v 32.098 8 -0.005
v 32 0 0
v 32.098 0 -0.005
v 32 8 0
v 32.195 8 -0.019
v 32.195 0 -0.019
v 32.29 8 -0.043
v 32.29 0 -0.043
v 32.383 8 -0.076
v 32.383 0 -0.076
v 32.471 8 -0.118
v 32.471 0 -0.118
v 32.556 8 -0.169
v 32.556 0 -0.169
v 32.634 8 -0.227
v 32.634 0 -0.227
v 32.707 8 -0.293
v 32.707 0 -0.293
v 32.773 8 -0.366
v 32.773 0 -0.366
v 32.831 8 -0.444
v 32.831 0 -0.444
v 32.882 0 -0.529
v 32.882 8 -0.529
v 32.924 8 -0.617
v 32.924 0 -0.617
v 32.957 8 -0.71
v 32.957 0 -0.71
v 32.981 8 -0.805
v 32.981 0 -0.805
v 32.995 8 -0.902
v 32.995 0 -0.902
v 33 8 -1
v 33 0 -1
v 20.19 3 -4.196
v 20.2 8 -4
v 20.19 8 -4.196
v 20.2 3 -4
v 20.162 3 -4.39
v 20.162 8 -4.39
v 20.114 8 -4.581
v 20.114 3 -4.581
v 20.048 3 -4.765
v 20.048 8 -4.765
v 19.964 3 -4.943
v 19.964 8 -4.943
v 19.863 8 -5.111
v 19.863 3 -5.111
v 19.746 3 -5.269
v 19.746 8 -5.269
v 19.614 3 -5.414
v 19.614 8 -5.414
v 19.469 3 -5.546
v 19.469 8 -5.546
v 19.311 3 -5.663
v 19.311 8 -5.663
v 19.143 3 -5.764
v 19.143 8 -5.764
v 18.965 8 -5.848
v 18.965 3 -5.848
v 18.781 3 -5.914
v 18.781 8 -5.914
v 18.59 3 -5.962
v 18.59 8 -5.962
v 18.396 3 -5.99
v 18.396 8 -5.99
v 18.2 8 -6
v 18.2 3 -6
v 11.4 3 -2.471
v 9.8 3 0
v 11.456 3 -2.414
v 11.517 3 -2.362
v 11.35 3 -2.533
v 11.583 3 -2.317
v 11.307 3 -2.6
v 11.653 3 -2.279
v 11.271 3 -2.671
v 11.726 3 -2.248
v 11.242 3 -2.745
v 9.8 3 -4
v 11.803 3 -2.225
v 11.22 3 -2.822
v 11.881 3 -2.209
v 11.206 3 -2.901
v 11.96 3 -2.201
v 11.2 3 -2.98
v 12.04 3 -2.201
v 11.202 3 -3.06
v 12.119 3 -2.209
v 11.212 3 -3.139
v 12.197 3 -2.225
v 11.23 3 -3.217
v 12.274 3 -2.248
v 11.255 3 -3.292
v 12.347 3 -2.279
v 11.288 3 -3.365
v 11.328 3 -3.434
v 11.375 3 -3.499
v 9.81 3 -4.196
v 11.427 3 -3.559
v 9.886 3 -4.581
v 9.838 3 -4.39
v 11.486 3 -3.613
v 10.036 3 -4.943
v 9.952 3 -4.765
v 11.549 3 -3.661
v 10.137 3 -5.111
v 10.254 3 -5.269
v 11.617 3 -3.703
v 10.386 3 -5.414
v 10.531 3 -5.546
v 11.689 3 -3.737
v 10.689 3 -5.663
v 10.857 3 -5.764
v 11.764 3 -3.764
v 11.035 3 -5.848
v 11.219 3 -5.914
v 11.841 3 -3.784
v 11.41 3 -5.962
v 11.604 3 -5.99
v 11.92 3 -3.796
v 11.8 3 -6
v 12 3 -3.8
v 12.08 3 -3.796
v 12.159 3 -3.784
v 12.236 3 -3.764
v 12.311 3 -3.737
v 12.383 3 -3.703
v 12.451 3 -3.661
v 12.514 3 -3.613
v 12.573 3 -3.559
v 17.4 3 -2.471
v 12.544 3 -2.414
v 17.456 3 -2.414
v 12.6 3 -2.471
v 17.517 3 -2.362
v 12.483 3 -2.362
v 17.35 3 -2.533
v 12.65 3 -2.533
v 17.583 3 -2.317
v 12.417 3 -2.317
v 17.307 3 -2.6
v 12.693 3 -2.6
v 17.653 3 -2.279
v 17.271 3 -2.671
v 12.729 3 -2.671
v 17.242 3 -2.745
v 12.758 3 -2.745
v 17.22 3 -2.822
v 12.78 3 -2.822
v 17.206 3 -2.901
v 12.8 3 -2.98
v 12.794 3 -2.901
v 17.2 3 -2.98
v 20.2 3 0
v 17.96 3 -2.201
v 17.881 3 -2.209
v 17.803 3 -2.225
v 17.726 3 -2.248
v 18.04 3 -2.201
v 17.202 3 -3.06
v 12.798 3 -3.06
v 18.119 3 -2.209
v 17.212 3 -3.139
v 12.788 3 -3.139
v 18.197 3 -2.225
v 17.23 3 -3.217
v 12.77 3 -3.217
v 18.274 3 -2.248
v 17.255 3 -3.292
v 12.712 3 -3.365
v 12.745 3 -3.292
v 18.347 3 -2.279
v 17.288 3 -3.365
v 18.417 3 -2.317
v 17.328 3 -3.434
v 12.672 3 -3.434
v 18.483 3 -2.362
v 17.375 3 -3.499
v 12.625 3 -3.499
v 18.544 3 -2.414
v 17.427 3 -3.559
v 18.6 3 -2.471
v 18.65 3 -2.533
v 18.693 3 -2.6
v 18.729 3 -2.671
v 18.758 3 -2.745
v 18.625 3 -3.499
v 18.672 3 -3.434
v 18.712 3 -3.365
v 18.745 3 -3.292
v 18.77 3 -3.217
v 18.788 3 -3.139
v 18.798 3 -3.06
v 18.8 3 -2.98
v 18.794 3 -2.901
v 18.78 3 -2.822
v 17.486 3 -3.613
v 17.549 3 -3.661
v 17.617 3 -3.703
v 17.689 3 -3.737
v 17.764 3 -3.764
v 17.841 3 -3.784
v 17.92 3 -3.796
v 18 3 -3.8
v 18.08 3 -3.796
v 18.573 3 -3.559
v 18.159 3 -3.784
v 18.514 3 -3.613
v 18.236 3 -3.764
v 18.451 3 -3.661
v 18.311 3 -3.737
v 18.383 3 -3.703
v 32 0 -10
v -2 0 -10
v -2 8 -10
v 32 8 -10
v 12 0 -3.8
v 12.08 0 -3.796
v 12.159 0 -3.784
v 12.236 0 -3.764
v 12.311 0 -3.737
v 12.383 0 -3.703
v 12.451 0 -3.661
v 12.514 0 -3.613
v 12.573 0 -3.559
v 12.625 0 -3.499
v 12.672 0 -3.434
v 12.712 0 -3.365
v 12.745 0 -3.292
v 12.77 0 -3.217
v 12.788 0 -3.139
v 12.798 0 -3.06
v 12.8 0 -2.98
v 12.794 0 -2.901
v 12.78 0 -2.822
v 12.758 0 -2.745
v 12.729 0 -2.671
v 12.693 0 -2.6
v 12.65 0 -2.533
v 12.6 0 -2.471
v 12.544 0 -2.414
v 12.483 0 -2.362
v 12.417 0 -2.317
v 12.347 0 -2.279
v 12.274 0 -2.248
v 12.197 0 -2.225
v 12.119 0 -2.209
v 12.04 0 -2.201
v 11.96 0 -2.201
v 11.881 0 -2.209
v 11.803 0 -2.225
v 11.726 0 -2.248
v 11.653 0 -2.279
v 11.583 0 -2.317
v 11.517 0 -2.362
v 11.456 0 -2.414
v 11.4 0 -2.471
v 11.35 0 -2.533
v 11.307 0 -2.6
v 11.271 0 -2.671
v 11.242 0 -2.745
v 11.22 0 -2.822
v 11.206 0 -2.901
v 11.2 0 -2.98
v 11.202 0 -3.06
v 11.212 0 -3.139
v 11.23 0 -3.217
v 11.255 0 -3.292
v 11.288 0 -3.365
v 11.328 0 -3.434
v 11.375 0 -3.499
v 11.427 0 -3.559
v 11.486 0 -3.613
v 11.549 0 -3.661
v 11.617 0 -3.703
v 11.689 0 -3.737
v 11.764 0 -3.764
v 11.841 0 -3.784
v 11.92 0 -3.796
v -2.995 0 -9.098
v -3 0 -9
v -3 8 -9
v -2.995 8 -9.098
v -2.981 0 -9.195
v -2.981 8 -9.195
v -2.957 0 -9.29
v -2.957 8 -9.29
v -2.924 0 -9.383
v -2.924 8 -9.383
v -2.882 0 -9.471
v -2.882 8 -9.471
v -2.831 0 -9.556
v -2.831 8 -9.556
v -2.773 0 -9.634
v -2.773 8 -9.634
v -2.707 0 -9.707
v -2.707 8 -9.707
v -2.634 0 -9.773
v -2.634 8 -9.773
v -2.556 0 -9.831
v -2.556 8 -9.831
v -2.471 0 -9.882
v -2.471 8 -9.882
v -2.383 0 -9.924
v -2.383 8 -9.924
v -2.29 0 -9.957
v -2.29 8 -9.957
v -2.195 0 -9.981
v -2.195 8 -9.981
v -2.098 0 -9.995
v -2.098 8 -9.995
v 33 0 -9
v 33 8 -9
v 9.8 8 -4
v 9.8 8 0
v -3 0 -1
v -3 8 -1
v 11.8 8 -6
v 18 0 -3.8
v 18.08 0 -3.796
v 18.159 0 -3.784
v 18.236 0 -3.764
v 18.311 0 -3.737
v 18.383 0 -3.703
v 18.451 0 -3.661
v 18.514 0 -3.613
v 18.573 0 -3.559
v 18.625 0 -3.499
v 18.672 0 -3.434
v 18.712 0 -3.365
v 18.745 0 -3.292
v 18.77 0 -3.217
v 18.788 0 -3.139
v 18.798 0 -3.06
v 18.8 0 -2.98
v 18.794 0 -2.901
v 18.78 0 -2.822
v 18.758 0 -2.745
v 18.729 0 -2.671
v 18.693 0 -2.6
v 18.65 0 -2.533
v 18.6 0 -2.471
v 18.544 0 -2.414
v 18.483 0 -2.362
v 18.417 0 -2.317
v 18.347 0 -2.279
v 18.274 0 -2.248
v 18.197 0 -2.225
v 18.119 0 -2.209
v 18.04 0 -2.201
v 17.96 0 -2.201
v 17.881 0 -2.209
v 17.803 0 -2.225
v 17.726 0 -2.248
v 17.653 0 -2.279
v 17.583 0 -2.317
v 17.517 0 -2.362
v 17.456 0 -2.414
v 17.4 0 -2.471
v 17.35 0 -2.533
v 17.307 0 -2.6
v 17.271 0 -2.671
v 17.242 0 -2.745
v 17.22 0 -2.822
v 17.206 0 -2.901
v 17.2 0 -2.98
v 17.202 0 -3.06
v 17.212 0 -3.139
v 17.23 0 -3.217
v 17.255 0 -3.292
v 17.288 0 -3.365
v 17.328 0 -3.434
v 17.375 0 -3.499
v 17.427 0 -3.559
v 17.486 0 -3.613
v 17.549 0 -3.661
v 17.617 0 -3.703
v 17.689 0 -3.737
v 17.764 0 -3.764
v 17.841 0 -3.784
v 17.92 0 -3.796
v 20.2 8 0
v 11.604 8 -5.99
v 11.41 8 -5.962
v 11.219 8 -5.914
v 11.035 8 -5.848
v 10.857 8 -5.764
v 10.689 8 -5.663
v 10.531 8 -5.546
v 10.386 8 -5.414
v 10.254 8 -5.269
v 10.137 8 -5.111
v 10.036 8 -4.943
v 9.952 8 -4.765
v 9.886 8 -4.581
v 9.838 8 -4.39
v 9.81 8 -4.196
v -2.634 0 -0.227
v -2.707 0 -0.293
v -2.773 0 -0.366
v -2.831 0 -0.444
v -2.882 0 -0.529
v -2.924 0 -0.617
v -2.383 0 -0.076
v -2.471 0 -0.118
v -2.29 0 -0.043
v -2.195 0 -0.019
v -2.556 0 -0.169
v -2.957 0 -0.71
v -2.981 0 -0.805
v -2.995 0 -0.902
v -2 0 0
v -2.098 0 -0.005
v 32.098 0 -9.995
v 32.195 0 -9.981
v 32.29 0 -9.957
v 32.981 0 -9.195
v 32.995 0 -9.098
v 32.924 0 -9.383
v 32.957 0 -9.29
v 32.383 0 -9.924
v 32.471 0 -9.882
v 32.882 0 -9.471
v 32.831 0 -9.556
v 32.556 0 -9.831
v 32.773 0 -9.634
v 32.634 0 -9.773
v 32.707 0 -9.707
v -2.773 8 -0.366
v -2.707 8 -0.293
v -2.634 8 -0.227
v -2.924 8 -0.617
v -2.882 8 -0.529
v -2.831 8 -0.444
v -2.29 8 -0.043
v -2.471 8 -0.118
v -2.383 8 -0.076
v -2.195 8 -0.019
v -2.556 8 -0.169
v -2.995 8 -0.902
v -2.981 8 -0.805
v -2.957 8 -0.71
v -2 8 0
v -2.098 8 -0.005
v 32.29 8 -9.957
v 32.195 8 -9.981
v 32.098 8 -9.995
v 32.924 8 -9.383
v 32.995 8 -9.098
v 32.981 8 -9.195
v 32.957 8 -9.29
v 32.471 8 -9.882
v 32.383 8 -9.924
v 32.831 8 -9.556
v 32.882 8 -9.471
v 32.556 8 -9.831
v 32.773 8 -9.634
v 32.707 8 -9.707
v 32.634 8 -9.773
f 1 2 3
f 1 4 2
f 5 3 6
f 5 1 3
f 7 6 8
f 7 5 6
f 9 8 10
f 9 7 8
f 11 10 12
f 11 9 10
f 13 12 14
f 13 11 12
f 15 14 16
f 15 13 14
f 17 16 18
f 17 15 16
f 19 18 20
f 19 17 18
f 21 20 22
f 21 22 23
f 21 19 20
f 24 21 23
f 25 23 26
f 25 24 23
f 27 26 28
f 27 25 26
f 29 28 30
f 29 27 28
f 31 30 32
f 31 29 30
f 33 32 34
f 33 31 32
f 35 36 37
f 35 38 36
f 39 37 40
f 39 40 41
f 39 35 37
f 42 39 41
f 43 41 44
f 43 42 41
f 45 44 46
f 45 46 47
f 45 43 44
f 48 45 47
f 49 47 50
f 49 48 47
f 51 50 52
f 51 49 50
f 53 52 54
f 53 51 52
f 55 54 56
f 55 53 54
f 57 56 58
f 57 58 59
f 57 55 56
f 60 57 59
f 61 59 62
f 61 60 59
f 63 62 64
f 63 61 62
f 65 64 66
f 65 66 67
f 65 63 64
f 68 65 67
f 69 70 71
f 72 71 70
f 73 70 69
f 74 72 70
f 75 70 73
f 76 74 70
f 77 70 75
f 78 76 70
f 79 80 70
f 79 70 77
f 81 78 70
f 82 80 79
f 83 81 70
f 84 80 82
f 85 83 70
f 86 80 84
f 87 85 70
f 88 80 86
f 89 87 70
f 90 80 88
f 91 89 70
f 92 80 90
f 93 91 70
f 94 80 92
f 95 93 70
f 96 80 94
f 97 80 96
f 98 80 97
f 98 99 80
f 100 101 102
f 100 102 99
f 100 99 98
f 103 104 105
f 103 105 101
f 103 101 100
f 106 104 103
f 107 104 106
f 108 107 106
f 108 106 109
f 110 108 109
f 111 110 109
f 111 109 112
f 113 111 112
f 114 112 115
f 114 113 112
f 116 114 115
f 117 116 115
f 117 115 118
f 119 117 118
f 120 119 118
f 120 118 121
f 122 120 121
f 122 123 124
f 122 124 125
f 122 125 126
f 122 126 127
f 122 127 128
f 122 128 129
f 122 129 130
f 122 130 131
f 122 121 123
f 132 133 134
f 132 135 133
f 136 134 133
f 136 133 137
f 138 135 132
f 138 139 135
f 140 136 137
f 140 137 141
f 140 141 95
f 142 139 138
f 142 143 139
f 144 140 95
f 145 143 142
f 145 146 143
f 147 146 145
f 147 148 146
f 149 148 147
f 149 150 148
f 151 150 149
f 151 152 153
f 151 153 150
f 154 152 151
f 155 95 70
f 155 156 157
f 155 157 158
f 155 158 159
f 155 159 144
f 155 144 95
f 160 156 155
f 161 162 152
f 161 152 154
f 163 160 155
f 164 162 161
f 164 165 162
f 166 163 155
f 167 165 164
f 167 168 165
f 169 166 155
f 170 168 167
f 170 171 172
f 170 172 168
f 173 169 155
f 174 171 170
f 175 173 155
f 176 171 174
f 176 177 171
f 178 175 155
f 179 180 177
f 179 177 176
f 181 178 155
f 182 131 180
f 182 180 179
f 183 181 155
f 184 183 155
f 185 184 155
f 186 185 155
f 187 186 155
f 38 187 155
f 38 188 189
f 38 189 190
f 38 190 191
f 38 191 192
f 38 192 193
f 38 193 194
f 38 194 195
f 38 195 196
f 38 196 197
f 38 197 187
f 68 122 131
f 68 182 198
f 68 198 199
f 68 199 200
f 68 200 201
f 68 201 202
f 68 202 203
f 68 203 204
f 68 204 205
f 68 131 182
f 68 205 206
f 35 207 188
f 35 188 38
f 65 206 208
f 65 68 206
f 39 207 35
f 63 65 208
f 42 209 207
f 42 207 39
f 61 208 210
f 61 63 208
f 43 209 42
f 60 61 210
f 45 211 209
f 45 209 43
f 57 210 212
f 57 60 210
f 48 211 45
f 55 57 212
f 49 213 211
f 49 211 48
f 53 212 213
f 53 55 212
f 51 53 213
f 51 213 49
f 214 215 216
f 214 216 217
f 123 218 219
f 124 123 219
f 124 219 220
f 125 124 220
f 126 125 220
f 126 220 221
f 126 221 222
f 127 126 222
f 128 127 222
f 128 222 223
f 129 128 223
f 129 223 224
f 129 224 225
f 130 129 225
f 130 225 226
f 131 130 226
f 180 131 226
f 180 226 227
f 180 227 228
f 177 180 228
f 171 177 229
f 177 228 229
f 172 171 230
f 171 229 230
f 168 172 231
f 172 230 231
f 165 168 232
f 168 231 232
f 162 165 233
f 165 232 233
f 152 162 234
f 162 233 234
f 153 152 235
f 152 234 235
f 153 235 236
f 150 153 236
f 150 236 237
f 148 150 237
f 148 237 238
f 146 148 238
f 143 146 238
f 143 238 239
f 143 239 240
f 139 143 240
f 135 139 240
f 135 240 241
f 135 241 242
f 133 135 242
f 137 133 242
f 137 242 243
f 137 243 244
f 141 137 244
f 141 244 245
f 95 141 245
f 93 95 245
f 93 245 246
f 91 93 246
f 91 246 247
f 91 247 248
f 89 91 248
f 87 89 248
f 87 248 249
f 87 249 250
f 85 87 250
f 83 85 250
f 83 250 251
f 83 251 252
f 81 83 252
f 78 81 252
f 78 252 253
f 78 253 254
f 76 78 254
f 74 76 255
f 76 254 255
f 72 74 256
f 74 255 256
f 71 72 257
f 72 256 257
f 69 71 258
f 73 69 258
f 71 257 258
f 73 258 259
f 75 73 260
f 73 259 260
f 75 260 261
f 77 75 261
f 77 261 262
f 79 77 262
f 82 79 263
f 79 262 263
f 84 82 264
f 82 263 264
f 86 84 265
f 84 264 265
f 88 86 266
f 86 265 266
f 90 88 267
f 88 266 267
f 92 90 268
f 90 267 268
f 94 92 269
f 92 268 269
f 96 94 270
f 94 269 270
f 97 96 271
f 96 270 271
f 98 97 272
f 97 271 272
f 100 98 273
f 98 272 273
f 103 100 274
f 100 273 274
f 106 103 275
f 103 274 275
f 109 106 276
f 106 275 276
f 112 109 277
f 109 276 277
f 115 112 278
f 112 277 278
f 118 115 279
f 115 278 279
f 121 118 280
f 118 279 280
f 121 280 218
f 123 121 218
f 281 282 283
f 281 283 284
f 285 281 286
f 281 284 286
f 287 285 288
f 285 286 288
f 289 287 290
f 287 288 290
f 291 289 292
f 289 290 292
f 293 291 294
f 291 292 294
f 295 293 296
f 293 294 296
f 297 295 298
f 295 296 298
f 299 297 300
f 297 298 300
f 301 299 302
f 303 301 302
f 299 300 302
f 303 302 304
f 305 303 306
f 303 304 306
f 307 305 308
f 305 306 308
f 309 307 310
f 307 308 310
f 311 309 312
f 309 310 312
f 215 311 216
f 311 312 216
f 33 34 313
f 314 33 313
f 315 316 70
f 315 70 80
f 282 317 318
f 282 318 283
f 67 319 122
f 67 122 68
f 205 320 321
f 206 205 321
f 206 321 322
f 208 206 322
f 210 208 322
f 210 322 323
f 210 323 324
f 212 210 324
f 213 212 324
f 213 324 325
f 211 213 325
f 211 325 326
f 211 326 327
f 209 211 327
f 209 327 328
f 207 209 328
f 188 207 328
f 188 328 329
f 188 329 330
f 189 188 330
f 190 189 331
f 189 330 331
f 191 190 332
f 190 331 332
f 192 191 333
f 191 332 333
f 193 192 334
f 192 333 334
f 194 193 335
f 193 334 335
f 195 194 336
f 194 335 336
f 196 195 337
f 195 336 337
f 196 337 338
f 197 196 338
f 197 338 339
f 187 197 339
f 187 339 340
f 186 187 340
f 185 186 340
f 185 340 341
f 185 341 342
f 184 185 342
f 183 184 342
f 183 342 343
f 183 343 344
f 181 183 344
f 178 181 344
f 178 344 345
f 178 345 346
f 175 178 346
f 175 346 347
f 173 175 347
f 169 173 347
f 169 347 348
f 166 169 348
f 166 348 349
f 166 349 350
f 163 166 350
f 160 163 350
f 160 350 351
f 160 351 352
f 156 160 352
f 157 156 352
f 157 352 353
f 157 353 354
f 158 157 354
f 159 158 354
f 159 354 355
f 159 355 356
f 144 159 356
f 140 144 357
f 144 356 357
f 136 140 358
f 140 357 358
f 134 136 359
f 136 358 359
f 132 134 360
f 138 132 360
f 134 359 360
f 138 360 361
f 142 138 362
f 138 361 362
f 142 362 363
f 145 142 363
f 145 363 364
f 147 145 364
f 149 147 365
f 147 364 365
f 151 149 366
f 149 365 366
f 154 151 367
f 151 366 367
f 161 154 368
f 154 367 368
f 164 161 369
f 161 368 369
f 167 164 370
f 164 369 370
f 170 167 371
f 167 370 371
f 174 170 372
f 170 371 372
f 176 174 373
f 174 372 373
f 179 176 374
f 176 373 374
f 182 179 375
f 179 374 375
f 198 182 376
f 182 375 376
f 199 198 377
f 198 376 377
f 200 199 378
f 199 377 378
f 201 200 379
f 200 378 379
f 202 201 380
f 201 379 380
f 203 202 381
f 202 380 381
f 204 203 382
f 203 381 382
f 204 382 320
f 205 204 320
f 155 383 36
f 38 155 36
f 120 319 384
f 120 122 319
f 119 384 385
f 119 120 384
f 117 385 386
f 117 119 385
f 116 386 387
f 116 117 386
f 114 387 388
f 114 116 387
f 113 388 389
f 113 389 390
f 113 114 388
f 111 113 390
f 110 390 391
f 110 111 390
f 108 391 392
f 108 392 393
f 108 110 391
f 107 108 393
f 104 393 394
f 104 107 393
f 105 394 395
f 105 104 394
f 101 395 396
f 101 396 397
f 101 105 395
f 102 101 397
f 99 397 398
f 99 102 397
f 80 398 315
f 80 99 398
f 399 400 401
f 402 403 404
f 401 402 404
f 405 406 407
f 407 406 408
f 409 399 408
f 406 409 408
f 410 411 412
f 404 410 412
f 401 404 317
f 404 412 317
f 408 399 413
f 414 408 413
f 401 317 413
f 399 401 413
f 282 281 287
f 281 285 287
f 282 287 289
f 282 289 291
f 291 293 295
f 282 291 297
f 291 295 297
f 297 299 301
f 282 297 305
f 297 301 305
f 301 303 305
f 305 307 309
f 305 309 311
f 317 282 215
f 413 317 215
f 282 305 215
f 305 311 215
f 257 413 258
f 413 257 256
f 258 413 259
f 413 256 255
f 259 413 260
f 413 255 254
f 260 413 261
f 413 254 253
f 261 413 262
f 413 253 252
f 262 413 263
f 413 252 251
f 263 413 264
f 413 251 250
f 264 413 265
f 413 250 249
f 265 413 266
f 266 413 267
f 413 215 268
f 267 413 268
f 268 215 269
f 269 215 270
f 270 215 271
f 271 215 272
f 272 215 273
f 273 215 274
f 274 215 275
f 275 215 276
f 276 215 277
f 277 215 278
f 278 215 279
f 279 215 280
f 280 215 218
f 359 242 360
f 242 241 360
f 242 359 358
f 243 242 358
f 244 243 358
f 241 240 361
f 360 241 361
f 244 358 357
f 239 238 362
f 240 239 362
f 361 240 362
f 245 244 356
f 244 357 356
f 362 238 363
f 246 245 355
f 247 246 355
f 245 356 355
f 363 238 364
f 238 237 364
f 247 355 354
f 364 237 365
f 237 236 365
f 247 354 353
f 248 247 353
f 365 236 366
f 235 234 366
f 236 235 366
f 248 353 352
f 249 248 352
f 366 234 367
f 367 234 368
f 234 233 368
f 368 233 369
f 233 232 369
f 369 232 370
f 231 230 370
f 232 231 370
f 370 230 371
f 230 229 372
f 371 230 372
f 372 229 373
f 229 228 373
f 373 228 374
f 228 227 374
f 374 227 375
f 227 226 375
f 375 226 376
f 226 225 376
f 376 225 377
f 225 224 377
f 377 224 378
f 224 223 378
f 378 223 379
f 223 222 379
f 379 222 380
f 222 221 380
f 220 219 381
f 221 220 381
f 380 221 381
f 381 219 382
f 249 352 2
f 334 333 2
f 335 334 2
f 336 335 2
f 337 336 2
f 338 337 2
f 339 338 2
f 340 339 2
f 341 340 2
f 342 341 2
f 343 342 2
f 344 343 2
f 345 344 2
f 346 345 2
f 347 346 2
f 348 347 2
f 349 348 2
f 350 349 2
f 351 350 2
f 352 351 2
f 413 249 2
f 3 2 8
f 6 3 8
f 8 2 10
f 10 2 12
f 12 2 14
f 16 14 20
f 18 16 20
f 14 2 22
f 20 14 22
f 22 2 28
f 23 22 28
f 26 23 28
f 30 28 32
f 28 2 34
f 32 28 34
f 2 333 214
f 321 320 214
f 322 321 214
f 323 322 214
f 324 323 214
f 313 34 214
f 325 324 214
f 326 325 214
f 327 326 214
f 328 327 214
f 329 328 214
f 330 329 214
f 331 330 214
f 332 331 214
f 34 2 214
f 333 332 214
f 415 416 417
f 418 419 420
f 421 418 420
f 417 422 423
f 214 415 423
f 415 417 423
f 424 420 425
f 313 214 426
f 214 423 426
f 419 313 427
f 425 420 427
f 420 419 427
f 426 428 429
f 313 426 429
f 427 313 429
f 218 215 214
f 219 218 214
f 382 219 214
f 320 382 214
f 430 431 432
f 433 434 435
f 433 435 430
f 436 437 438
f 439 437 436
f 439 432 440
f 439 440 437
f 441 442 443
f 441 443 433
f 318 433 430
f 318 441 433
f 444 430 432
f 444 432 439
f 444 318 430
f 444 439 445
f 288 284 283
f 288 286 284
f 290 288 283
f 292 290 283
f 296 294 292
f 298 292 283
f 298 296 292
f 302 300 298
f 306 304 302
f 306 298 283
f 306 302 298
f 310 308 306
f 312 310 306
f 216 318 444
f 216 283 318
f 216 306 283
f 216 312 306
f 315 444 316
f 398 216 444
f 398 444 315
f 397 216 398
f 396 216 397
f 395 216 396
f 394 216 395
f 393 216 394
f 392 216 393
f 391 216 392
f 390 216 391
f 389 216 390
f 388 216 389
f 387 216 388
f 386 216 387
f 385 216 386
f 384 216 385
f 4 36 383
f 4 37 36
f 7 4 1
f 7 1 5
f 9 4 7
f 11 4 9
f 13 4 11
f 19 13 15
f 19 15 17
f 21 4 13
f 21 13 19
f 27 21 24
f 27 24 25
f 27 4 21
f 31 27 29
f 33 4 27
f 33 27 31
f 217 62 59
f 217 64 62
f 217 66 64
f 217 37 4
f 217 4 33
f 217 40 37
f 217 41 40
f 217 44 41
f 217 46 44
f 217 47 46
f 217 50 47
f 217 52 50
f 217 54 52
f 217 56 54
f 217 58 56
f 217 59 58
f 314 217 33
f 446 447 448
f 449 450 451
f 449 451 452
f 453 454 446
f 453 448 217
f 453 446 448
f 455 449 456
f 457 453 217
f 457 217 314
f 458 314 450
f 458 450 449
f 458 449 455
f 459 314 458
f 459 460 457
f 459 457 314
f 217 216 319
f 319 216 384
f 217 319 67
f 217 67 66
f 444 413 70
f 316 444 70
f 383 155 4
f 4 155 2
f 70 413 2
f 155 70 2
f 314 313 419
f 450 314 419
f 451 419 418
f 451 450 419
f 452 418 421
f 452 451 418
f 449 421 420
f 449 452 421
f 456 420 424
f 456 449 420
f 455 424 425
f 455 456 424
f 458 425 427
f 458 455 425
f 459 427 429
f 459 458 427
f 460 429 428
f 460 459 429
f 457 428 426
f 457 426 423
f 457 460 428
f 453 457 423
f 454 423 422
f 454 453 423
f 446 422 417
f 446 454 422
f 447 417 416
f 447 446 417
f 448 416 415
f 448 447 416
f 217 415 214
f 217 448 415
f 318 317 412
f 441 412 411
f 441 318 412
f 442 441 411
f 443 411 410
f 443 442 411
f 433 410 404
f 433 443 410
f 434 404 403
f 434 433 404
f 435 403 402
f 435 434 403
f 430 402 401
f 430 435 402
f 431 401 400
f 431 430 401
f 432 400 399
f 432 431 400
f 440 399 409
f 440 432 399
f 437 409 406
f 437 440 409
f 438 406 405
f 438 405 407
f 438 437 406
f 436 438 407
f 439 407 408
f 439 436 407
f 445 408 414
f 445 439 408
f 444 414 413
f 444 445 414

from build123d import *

# Parameters (mm, degrees)
ESBO_O2_W                                  = 36
ESBO_O2_H                                  = 10
RESSALTO_EXTRUS_O2_DEPTH                   = 8
FILETE3_R                                  = 1
ESBO_O5_W                                  = 10.4
ESBO_O5_H                                  = 6
CORTE_EXTRUS_O1_DEPTH                      = 5
FILETE4_R                                  = 2
BROCA_DE_ROSQUEAR_PARA_TARRAXA_DE_M2X0_4_D = 1.6


with BuildPart() as part:
    # Esboço2 → Ressalto-extrusão2 (new body)
    with BuildSketch(Plane(origin=(0, 0, 0), x_dir=(1, 0, 0), z_dir=(0, 1, 0))):
        with Locations((15, 5)):
            Rectangle(ESBO_O2_W, ESBO_O2_H)
    extrude(amount=RESSALTO_EXTRUS_O2_DEPTH)

    # Filete3
    filete3_edges = [part.edges().sort_by_distance(p)[0] for p in [
        (33, 4, 0),
        (-3, 4, 0),
        (-3, 4, -10),
        (33, 4, -10),
    ]]
    fillet(filete3_edges, radius=FILETE3_R)

    # Esboço5 → Corte-extrusão1 (cut)
    with BuildSketch(Plane(origin=(0, 8, 0), x_dir=(1, 0, 0), z_dir=(0, 1, 0))):
        with Locations((15, 3)):
            Rectangle(ESBO_O5_W, ESBO_O5_H)
    extrude(amount=-CORTE_EXTRUS_O1_DEPTH, mode=Mode.SUBTRACT)

    # Filete4
    filete4_edges = [part.edges().sort_by_distance(p)[0] for p in [
        (20.2, 5.5, -6),
        (9.8, 5.5, -6),
    ]]
    fillet(filete4_edges, radius=FILETE4_R)

    # Broca de rosquear para tarraxa de M2x0.41 (through all)
    with Locations(Plane(origin=(12, 3, -3), x_dir=(0, 0, 1), z_dir=(0, 1, 0))):
        with Locations((0, 0), (0, 6)):
            Hole(BROCA_DE_ROSQUEAR_PARA_TARRAXA_DE_M2X0_4_D / 2)


solid = part.part
